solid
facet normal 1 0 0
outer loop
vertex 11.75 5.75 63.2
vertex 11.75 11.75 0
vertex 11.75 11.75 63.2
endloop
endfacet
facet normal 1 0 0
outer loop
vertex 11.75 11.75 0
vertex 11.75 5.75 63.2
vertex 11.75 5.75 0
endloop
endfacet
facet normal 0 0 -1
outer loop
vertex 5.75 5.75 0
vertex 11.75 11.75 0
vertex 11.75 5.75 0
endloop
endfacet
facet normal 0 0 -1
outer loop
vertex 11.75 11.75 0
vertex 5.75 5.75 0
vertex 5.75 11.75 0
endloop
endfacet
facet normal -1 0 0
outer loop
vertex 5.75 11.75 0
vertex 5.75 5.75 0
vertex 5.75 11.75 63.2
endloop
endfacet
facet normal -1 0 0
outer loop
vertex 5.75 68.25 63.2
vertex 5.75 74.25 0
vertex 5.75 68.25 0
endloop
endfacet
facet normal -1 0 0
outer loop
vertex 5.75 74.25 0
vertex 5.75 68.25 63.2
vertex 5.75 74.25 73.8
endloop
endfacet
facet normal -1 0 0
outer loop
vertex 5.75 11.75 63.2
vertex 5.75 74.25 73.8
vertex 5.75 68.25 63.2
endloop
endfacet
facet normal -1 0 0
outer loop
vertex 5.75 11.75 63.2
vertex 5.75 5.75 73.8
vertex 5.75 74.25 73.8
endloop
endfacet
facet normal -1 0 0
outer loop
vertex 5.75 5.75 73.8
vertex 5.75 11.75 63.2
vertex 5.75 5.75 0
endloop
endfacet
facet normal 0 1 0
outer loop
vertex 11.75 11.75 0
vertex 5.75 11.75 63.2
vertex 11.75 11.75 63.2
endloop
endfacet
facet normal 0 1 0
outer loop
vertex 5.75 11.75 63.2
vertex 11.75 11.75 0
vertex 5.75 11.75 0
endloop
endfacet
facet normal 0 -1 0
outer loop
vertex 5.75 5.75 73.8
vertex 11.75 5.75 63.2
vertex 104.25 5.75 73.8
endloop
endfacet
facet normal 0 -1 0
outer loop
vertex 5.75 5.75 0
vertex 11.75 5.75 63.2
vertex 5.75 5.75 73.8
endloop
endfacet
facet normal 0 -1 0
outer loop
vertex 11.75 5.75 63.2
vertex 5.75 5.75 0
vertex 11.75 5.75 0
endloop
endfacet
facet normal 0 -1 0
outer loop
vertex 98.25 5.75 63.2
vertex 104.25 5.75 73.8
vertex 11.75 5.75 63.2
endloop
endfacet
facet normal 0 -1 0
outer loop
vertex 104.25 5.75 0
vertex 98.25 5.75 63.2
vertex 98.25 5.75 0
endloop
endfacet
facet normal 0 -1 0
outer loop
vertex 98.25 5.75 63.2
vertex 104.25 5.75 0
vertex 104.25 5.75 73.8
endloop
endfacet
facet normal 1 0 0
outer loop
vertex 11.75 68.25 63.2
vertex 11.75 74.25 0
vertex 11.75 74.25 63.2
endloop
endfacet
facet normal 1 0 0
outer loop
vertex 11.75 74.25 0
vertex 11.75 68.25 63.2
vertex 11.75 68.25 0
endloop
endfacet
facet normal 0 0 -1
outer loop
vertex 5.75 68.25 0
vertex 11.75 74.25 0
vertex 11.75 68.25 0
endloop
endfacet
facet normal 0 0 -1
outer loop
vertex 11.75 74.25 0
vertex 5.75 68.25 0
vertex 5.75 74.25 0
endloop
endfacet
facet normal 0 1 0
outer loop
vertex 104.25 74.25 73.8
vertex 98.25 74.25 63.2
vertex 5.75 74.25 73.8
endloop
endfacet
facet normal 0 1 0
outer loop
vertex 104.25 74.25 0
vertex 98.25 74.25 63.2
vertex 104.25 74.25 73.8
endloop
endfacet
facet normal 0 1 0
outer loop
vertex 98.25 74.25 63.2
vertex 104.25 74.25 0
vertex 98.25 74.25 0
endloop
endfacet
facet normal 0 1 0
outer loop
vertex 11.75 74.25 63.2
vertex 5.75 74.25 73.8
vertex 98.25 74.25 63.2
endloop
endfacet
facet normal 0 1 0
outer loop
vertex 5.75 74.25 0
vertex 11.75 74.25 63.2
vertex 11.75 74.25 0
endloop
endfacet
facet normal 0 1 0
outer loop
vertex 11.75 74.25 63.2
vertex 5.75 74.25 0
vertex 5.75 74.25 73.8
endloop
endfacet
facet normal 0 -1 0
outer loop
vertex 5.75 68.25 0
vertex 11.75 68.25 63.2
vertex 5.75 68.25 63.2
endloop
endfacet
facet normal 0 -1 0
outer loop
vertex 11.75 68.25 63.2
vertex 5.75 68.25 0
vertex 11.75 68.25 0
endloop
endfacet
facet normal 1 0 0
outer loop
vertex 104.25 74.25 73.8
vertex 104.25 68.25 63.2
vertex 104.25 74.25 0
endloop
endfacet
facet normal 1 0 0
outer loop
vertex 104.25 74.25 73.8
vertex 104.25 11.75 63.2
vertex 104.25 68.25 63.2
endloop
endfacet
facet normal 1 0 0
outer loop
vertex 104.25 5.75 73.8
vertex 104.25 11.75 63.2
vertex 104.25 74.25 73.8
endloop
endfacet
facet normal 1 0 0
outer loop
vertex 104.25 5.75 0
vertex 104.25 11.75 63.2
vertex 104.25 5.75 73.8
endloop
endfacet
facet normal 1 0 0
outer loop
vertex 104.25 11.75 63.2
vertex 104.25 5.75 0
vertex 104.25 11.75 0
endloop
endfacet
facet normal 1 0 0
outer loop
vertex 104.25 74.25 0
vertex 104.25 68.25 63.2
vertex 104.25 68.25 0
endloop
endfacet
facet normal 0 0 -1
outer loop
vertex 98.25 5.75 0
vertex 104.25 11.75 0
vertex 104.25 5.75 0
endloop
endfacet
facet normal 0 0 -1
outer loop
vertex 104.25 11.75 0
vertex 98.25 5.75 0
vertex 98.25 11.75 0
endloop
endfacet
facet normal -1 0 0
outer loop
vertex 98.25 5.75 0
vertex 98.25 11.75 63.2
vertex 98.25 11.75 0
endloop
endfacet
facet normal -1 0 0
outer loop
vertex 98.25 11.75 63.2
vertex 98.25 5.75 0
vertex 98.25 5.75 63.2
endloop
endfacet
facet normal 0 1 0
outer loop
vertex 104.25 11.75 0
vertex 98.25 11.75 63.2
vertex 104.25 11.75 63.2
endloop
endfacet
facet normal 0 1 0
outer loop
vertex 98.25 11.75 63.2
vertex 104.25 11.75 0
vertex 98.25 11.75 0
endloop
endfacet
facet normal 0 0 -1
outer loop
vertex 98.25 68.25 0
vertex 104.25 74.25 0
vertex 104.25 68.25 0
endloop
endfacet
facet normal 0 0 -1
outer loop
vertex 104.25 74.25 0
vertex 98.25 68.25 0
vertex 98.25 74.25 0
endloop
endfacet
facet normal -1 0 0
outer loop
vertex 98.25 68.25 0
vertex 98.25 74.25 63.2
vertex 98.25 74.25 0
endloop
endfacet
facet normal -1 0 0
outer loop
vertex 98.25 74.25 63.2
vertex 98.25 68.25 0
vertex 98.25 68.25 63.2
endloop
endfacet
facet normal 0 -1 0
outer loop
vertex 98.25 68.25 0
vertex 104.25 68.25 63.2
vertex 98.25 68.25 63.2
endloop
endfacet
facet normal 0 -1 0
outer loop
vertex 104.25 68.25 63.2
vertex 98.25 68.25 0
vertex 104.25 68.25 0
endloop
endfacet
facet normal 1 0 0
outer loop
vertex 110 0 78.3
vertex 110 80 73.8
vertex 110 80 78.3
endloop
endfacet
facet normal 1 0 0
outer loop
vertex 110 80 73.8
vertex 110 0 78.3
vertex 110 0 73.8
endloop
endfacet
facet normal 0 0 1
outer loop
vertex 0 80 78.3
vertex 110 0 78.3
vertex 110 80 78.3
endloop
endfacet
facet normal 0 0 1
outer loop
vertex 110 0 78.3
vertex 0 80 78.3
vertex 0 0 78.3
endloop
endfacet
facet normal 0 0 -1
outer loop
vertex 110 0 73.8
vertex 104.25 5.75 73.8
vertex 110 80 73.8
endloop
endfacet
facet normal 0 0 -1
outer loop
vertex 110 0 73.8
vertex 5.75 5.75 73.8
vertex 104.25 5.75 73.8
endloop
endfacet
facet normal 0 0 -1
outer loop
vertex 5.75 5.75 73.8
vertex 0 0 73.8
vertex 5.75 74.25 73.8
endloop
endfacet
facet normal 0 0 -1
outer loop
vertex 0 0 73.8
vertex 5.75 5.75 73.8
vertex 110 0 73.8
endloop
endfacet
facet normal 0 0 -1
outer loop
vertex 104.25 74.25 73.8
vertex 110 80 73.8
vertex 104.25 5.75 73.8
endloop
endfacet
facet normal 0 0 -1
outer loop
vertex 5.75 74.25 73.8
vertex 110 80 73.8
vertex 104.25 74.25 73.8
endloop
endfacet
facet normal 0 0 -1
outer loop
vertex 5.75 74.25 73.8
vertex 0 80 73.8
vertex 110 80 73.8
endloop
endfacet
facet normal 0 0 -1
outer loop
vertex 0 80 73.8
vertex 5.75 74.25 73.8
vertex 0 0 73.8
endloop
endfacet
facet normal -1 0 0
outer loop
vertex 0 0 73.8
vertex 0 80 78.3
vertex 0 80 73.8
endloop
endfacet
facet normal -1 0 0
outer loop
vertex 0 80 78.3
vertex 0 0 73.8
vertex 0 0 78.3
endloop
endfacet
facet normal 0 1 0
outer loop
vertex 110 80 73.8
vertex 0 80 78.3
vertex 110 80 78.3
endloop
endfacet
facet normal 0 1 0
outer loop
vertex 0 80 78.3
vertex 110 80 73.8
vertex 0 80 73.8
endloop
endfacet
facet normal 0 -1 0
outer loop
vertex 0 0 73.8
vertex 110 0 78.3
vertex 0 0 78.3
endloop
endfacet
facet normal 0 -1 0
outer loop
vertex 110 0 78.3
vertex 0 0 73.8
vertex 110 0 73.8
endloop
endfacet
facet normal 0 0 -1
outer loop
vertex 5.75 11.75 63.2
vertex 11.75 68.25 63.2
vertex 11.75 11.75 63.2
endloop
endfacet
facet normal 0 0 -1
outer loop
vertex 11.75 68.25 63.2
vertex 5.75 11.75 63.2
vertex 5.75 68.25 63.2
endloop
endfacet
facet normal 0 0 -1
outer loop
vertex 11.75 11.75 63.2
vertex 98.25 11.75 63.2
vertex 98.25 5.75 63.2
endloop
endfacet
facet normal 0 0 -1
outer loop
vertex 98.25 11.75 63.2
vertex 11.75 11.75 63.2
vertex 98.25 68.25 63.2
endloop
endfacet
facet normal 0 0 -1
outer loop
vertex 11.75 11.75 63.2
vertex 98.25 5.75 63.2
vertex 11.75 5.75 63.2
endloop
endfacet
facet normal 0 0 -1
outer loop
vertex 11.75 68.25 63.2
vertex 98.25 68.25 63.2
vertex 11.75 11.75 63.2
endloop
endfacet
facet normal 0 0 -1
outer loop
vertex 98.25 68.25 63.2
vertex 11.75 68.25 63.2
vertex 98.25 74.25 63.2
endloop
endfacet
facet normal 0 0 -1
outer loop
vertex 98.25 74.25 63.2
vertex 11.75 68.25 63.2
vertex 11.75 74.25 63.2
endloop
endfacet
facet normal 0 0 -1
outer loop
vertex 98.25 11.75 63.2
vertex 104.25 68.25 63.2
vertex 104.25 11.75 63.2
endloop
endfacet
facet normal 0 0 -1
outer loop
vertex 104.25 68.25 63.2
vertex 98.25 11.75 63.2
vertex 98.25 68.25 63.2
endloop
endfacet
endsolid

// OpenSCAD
plate_length = 110;
plate_width = 80;
plate_height = 4.5;

sub_length = 98.5;
sub_width = 68.5;
sub_height = 10.6;

leg_length = 73.8;
leg_width = 6;

translate([0, 0, leg_length])
  cube([plate_length, plate_width, plate_height]);

translate([
  plate_length / 2 - sub_length / 2,
  plate_width / 2 - sub_width / 2,
  leg_length - sub_height
])
cube([sub_length, sub_width, sub_height]);

x_values = [(plate_length - sub_length) / 2, (plate_length - sub_length) / 2 + sub_length - leg_width];
y_values = [(plate_width - sub_width) / 2, (plate_width - sub_width) / 2 + sub_width - leg_width];

for (x = x_values, y = y_values) {
  translate([x, y, 0])
  cube([leg_width, leg_width, leg_length]);
}
